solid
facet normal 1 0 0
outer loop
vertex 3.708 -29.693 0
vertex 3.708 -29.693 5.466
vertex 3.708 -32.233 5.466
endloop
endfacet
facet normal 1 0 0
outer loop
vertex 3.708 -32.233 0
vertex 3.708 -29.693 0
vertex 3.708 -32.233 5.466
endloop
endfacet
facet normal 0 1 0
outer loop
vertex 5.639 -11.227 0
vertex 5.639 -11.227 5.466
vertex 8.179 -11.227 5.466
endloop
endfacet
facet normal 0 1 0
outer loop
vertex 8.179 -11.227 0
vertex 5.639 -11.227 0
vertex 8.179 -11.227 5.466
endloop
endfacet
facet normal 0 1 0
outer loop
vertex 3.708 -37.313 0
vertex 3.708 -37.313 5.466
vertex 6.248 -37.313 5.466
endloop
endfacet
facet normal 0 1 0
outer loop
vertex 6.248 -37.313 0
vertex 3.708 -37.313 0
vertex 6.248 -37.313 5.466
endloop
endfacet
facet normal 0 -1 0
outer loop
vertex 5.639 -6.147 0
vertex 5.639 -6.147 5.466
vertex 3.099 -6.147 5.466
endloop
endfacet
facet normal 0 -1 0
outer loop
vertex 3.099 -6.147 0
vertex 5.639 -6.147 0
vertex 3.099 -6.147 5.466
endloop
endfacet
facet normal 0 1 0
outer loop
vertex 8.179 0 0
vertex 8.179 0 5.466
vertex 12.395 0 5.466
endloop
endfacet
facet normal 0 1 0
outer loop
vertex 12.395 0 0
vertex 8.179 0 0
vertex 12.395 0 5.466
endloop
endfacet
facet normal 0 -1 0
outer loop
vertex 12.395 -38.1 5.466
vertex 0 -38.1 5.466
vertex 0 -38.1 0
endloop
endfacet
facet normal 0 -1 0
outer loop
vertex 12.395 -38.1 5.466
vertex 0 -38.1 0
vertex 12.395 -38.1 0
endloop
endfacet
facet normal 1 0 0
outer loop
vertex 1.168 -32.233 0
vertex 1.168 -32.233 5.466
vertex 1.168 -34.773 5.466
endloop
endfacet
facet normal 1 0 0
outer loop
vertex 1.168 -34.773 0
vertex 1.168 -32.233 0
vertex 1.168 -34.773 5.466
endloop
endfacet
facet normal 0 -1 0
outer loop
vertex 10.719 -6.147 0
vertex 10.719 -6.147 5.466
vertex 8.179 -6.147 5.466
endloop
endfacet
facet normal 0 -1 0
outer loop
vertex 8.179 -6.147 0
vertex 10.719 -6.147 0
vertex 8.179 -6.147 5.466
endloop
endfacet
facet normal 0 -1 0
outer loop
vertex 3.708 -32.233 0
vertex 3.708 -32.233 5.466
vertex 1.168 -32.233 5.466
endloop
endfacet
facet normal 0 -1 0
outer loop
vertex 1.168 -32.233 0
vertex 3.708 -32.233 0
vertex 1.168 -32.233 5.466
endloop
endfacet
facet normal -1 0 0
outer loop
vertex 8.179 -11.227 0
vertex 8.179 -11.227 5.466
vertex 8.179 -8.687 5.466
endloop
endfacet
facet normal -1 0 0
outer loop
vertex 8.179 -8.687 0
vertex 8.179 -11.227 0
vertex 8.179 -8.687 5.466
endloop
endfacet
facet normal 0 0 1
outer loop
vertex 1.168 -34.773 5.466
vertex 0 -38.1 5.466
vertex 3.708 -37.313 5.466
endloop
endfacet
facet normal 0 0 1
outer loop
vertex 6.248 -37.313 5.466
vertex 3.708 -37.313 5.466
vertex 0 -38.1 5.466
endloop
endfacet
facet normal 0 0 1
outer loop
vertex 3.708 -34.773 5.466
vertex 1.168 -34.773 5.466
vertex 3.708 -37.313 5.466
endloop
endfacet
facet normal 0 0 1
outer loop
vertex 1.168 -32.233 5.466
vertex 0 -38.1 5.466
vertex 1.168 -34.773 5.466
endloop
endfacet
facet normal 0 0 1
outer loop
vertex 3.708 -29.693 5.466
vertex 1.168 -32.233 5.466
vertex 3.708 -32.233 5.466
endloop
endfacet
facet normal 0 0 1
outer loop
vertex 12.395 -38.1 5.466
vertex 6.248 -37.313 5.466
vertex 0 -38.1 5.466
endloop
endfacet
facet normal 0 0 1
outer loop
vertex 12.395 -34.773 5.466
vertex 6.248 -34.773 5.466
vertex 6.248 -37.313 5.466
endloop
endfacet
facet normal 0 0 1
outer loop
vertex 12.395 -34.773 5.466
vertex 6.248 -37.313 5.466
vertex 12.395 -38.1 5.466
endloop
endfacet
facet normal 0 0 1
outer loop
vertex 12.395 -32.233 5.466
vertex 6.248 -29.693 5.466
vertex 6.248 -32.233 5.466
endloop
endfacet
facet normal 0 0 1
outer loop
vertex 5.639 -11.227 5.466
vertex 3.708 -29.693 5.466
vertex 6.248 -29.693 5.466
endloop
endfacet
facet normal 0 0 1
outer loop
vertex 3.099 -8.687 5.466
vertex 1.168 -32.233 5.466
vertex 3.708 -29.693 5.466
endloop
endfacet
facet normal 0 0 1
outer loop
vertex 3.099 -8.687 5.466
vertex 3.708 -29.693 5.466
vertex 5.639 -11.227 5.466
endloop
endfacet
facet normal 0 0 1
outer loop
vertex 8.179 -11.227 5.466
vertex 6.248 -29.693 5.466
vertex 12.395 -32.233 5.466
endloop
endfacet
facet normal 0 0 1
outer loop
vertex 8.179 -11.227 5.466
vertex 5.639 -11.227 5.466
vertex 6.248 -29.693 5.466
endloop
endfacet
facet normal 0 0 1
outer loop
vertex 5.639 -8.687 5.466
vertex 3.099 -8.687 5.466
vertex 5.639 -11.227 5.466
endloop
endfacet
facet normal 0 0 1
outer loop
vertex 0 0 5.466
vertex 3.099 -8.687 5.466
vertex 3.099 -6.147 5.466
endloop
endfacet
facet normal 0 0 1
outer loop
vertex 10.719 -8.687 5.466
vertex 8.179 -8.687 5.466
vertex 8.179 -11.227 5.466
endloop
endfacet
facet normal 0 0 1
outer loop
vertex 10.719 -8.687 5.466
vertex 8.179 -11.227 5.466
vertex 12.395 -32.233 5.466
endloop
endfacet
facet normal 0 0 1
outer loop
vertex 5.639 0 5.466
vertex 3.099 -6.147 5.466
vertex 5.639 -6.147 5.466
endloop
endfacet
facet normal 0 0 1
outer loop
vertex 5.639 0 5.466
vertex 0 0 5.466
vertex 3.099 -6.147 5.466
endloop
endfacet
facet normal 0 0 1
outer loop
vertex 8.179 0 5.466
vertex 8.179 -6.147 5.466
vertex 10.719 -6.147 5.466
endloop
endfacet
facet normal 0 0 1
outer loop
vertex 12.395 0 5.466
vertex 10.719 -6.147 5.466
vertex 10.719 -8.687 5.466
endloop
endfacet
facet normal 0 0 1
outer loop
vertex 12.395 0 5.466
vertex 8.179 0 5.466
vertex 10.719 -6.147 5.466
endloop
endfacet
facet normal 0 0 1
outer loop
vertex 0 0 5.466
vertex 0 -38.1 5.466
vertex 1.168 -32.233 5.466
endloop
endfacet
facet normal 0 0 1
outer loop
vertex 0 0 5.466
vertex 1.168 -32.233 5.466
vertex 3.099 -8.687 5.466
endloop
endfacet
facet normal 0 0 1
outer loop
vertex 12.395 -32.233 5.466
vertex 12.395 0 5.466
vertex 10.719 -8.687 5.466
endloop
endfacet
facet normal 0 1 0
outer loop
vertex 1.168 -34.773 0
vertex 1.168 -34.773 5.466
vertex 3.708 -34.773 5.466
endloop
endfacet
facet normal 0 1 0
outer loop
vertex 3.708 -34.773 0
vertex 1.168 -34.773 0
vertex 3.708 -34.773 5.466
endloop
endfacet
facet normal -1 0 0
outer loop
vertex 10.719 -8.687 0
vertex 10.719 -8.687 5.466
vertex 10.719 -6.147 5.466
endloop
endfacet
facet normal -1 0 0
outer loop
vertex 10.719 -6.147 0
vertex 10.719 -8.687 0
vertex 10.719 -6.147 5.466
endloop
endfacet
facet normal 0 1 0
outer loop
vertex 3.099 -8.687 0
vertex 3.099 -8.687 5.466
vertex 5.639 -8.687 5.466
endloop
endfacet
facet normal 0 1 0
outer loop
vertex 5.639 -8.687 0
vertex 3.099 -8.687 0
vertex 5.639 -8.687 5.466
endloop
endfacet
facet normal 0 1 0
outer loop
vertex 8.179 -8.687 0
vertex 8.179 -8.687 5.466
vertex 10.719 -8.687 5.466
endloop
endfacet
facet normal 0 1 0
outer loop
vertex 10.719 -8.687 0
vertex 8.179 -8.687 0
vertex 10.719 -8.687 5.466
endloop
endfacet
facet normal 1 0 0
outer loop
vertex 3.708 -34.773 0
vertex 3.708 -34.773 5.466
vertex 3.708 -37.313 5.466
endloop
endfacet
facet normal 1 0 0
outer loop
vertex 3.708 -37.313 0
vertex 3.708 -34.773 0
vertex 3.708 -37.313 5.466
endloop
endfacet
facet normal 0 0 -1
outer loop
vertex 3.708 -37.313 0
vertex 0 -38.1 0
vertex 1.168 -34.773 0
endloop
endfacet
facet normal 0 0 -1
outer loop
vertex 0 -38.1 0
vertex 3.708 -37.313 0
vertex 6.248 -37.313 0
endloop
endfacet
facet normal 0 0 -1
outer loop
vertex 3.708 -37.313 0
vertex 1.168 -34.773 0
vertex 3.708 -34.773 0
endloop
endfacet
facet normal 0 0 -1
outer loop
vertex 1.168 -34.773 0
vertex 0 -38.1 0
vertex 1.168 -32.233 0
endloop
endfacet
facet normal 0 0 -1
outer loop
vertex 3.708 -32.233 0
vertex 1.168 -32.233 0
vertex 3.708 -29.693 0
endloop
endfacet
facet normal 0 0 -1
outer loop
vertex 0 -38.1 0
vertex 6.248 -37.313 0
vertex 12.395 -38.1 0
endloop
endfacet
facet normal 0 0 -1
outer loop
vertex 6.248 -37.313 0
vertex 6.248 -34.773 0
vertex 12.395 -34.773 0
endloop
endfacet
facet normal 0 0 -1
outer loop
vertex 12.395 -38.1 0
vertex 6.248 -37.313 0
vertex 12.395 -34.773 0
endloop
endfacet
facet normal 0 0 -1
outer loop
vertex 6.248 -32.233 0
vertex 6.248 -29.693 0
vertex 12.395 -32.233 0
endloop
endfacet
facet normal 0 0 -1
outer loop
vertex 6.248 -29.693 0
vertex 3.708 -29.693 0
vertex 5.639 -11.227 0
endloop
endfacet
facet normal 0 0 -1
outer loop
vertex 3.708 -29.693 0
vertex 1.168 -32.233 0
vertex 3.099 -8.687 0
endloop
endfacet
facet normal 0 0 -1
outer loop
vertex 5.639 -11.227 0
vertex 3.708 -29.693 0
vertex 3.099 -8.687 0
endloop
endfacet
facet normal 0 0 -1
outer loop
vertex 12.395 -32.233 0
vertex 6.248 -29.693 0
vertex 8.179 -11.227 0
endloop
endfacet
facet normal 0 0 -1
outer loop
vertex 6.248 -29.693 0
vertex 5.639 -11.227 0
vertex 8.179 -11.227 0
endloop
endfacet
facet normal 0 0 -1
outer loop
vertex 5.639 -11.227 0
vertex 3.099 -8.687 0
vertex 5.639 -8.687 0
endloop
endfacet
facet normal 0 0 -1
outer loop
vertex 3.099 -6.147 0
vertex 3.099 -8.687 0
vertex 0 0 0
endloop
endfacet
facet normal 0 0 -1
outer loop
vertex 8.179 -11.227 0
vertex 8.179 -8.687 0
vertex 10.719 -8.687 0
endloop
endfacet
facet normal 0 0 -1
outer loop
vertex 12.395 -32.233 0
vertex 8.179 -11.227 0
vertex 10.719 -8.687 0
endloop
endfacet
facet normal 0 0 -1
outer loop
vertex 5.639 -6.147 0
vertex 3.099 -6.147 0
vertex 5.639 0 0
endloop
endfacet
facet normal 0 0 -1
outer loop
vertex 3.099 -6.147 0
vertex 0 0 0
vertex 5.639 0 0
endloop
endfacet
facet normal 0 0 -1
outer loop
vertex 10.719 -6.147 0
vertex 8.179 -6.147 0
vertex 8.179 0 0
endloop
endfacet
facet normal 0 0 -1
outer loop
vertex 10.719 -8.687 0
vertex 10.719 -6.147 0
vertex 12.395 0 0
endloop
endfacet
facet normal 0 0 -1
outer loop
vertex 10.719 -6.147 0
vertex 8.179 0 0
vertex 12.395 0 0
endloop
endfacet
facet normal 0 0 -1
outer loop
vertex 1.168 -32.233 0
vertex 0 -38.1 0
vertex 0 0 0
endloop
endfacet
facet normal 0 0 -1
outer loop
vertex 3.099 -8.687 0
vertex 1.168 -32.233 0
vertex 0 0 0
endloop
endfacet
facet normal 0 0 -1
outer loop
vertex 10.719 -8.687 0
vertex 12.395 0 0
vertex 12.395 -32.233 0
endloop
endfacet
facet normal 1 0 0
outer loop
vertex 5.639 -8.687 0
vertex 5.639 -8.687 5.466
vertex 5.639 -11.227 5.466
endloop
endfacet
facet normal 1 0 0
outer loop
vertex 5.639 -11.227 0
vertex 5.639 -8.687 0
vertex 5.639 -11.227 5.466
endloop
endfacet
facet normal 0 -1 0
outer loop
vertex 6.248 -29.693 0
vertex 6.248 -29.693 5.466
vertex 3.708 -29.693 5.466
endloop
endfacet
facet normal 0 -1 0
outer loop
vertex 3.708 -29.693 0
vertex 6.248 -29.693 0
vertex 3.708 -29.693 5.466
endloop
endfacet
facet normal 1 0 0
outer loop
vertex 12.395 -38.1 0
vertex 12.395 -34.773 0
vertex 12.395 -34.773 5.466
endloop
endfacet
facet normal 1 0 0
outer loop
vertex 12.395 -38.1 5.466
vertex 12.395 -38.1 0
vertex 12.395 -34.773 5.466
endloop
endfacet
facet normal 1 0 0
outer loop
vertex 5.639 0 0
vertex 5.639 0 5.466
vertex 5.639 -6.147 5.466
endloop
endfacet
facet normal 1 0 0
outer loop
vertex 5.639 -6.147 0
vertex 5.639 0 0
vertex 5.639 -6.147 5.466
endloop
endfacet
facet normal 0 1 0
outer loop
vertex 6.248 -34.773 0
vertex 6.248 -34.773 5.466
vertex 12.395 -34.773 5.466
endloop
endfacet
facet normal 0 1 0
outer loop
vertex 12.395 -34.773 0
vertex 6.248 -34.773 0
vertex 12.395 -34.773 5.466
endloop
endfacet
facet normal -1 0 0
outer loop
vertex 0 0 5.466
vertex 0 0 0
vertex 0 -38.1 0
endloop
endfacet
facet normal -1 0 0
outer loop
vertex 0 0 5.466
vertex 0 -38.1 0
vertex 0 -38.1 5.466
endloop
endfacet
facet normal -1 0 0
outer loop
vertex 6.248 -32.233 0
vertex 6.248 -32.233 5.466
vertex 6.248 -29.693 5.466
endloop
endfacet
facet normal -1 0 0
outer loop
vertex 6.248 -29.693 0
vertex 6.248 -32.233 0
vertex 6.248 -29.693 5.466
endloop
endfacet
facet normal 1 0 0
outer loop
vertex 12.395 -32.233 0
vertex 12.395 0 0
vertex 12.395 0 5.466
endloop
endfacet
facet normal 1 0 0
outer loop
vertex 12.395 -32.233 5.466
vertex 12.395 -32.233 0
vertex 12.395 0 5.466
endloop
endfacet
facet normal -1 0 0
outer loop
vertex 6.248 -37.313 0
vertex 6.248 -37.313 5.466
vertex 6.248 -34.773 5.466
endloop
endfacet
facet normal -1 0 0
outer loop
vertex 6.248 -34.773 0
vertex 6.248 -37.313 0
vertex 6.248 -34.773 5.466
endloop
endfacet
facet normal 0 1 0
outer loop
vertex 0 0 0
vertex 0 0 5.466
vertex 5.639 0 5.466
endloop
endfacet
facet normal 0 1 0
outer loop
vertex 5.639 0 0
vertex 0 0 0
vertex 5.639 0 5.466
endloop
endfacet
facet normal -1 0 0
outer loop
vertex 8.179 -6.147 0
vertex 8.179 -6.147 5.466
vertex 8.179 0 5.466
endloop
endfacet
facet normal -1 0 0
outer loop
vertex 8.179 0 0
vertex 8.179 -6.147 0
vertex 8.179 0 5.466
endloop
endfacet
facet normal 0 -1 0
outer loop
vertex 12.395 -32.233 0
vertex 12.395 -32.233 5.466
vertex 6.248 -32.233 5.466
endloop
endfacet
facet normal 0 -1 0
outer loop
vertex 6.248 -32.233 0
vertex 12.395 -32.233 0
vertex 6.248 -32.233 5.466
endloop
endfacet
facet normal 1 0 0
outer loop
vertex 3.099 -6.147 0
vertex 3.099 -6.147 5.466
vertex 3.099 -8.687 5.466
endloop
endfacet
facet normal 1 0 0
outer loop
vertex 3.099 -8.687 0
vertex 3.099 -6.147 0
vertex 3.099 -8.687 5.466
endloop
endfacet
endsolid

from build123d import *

# Parameters (mm, degrees)
F0_W     = 12.3952
F0_H     = 5.465724
F1_DEPTH = 38.1
F3_DEPTH = 25.4
F4_DEPTH = 25.4


with BuildPart() as f1:
    # F0 (on Front) → F1 (new body)
    with BuildSketch(Plane.XZ):
        with Locations((6.1976, 2.732862)):
            Rectangle(F0_W, F0_H)
    extrude(amount=F1_DEPTH)

    # F2 (on face) → F3 (cut)
    with BuildSketch(Plane.XY.offset(5.465724)):
        Polygon((8.179207, 0), (5.639207, 0), (5.639207, -6.1468), (3.099207, -6.1468), (3.099207, -8.6868), (5.639207, -8.6868), (5.639207, -11.2268), (8.179207, -11.2268), (8.179207, -8.6868), (10.719207, -8.6868), (10.719207, -6.1468), (8.179207, -6.1468), align=None)
    extrude(amount=-F3_DEPTH, mode=Mode.SUBTRACT)

    # F2 (on face) → F4 (cut)
    with BuildSketch(Plane.XY.offset(5.465724)):
        Polygon((12.3952, -34.77345), (12.3952, -32.23345), (6.2484, -32.23345), (6.2484, -29.69345), (3.7084, -29.69345), (3.7084, -32.23345), (1.1684, -32.23345), (1.1684, -34.77345), (3.7084, -34.77345), (3.7084, -37.31345), (6.2484, -37.31345), (6.2484, -34.77345), align=None)
    extrude(amount=-F4_DEPTH, mode=Mode.SUBTRACT)


solid = f1.part
